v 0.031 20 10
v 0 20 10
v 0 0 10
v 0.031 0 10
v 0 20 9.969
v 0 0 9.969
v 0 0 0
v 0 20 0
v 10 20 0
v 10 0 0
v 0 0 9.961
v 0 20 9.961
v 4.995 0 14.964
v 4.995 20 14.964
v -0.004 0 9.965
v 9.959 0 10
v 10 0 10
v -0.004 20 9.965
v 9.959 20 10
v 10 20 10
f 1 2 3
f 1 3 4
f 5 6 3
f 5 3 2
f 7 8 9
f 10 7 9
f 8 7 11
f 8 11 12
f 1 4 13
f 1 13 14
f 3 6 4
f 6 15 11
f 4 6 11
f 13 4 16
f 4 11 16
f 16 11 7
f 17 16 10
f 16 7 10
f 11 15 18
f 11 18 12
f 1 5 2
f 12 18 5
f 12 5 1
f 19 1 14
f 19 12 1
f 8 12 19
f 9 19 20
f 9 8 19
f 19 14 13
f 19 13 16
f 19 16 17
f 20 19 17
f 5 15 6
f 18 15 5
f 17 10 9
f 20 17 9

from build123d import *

# Parameters (mm, degrees)
BOX_W                  = 10
BOX_H                  = 20
BOX_DEPTH              = 10
BOX001_W               = 7.07
BOX001_H               = 20
BOX001_DEPTH           = 7.07
BOX001_PLACEMENT_ANGLE = 45


with BuildPart() as cubo:
    # Box → Box (new body)
    with BuildSketch(Plane.XY):
        with Locations((5, 10)):
            Rectangle(BOX_W, BOX_H)
    extrude(amount=BOX_DEPTH)


with BuildPart() as fusion:
    # Box001 → Box001 (new body)
    with BuildSketch(Plane.XY):
        with Locations((3.535, 10)):
            Rectangle(BOX001_W, BOX001_H)
    extrude(amount=BOX001_DEPTH)


with BuildPart() as fusion_1:
    # Box001 placement: moved
    add(fusion.part.moved(Location((-0.004245, 0, 9.965))).rotate(Axis((-0.004245, 0, 9.965), (0, 1, 0)), BOX001_PLACEMENT_ANGLE))

    # Fusion: union Cubo
    add(cubo.part)


solid = fusion_1.part
